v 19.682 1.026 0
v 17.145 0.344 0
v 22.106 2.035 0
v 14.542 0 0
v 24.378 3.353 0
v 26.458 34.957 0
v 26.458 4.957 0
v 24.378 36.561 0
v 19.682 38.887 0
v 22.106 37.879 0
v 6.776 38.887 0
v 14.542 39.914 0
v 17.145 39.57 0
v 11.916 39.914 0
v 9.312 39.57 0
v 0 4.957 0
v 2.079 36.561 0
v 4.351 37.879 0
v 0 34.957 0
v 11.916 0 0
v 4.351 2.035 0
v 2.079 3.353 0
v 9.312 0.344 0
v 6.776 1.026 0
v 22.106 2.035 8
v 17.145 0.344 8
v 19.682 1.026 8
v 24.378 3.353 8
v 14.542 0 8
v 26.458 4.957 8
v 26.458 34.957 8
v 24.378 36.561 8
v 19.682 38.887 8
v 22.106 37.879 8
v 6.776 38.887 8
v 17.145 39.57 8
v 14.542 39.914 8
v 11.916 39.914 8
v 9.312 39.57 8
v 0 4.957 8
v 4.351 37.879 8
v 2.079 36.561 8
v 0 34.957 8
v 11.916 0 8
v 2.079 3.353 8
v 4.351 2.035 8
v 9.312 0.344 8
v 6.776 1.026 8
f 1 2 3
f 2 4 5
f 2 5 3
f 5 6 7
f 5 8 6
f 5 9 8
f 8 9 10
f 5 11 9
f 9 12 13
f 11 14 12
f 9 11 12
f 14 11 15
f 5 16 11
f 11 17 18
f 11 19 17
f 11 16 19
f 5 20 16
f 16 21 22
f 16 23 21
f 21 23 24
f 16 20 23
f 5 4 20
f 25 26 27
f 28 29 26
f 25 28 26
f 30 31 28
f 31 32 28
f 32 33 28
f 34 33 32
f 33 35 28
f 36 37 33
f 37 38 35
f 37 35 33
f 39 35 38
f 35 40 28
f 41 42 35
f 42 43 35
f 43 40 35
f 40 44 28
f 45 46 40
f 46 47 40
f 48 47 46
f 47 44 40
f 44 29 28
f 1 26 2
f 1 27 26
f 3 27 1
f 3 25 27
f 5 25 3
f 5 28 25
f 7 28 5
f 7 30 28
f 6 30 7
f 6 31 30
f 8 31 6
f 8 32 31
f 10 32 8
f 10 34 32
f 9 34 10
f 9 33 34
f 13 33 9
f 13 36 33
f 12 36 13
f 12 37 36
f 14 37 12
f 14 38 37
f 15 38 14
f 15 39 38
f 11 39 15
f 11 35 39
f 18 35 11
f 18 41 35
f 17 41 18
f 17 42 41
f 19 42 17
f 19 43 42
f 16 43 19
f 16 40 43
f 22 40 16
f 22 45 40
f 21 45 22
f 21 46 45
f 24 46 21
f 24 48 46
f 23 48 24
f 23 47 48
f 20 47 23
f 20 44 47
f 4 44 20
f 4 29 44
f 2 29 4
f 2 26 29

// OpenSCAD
$fn = 32;

// ----------------------------------------------------------------------
// Eccentric disc: double_d, 8 mm thick
// ----------------------------------------------------------------------

// --- parameters (mm) ---
profile_height = 8;       // extrusion height
profile_points = 24;      // points of the closed outline

profile = [[26.458, 34.957], [24.378, 36.561], [22.106, 37.879], [19.682, 38.887], [17.145, 39.57], [14.542, 39.914], [11.916, 39.914], [9.312, 39.57], [6.776, 38.887], [4.351, 37.879], [2.079, 36.561], [0, 34.957], [0, 4.957], [2.079, 3.353], [4.351, 2.035], [6.776, 1.026], [9.312, 0.344], [11.916, 0], [14.542, 0], [17.145, 0.344], [19.682, 1.026], [22.106, 2.035], [24.378, 3.353], [26.458, 4.957]];  // single closed polygon, 24 points, counter clockwise

// --- the one profile operation ---
linear_extrude(height = profile_height) polygon(points = profile);
